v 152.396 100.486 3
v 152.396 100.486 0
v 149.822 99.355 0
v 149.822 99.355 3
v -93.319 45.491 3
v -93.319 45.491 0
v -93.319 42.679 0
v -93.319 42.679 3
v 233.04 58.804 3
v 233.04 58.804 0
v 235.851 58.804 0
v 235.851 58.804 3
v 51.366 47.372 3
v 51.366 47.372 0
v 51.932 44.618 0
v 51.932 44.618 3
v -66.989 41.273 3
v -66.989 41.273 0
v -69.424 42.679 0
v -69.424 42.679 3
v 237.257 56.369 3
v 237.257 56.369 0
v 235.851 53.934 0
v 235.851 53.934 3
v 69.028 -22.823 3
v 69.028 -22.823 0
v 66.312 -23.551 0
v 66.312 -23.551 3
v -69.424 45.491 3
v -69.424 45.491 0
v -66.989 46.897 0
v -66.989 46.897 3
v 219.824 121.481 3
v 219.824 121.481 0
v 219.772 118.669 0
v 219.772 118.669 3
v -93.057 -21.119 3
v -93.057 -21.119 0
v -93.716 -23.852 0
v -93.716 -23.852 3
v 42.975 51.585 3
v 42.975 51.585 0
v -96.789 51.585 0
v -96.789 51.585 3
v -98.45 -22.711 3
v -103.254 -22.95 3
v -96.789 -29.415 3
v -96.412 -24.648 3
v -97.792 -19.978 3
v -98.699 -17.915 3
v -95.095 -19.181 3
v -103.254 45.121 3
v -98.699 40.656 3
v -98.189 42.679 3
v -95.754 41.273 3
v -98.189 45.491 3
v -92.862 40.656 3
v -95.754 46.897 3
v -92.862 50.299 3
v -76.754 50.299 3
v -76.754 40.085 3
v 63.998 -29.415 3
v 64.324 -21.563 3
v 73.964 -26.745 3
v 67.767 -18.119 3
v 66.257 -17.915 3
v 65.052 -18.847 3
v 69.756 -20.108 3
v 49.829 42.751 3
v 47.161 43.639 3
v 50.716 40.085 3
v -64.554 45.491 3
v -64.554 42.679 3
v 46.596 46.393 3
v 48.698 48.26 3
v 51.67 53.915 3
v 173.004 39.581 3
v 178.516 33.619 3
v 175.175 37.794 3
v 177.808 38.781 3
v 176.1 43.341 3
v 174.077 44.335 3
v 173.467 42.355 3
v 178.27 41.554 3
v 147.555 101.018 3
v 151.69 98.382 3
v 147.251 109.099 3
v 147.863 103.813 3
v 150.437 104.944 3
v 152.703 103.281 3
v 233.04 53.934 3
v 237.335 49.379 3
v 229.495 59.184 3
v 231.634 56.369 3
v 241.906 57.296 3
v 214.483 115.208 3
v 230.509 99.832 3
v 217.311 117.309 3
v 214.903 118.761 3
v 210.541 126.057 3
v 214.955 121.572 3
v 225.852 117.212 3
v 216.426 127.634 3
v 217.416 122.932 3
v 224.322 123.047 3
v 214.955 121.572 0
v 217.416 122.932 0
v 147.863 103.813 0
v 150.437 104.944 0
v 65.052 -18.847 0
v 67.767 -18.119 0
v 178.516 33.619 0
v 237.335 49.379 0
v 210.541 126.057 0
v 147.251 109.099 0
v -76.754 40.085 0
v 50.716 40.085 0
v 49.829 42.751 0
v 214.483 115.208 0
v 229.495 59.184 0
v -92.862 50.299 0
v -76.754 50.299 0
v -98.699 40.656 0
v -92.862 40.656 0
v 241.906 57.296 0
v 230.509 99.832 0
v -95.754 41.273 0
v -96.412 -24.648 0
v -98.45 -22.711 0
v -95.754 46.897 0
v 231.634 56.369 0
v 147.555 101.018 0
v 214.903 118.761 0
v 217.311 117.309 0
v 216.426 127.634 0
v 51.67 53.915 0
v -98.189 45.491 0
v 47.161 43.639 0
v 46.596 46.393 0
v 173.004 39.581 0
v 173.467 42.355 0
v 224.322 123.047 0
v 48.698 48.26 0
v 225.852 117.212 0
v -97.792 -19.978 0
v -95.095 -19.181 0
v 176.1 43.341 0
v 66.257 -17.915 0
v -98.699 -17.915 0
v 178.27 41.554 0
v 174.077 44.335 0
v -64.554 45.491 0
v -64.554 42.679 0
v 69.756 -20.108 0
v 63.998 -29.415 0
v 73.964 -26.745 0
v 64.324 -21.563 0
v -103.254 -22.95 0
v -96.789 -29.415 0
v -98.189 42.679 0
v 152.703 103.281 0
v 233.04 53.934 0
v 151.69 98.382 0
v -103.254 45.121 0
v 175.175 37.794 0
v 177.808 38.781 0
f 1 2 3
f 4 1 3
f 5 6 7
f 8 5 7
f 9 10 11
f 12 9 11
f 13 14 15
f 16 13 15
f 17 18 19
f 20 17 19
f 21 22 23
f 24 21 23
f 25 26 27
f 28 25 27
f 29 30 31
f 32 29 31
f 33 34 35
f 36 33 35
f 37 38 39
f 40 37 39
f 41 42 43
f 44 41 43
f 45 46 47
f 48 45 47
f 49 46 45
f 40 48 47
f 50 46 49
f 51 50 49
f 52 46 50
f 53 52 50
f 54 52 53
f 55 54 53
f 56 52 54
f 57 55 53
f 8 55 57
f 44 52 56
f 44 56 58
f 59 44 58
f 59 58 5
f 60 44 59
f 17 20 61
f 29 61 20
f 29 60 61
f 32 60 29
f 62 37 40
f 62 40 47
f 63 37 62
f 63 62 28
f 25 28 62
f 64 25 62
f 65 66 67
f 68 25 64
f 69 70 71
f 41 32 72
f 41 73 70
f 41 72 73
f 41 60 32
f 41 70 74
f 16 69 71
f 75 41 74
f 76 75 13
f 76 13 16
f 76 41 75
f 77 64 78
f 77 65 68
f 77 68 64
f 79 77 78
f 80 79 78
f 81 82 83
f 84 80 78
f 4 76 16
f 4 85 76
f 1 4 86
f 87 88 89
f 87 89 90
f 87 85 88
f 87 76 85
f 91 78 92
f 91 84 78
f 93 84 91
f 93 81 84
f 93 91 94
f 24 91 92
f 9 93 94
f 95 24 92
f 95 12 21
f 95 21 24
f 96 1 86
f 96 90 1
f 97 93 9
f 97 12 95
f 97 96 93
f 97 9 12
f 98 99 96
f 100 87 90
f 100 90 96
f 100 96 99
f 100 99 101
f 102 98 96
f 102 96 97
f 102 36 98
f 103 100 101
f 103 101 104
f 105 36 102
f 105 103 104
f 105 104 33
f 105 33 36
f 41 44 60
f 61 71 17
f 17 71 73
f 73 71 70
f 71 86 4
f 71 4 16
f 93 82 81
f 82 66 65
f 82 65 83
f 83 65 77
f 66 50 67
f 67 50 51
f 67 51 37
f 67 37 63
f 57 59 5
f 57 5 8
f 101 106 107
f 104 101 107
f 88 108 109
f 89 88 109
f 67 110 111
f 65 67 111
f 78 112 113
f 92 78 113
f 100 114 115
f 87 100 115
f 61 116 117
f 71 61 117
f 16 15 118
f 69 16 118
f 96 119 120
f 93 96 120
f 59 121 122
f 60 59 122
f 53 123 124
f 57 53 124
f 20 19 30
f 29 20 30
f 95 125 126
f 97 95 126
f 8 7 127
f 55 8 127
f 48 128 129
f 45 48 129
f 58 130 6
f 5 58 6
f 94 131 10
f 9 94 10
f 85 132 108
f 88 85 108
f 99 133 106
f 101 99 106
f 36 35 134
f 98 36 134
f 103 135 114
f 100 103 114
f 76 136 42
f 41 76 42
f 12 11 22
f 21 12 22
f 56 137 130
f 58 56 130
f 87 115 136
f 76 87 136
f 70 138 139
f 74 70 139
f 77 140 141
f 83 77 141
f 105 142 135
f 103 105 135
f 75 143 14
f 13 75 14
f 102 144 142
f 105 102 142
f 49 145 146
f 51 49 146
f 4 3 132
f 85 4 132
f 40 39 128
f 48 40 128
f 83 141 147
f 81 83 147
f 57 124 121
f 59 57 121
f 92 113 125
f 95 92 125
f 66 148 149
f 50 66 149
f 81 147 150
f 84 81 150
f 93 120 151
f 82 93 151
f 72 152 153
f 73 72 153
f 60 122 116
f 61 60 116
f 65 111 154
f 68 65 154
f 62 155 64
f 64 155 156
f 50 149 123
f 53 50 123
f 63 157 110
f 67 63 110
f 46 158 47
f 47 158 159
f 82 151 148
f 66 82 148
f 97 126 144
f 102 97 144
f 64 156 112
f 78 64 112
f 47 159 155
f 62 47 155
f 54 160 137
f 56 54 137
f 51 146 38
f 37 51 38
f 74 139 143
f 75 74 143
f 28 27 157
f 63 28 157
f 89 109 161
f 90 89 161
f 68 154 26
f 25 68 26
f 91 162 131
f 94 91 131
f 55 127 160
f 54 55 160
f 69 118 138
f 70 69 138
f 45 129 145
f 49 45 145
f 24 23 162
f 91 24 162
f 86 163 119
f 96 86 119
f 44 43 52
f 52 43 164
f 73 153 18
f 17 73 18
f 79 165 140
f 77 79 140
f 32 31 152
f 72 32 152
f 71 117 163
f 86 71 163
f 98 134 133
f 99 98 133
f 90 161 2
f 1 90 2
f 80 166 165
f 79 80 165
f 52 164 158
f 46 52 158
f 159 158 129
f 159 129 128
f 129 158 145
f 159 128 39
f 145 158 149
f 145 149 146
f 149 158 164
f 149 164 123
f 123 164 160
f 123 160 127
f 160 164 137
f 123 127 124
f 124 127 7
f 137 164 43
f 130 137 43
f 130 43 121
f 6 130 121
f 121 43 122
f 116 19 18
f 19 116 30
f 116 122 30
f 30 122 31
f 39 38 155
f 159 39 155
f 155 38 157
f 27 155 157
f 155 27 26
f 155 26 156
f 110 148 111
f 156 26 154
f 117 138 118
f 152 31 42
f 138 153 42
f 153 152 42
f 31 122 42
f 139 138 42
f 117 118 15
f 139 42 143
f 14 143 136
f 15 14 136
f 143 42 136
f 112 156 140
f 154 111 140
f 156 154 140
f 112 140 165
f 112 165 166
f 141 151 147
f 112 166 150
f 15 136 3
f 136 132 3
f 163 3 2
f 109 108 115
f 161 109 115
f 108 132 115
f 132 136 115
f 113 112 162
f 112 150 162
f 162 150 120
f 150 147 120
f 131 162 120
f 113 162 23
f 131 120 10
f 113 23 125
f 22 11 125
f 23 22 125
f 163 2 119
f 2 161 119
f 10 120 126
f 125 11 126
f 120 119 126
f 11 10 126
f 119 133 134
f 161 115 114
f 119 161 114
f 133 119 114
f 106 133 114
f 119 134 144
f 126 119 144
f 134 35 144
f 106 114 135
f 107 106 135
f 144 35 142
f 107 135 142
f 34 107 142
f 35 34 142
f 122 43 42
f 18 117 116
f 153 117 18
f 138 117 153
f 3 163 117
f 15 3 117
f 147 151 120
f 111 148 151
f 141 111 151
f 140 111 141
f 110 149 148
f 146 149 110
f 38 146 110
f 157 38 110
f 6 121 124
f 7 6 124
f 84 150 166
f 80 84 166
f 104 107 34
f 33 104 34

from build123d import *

# Parameters (mm, degrees)
BOSS_EXTRU_1_DEPTH = 3


with BuildPart() as part:
    # Esquisse1 → Boss.-Extru.1 (new body)
    with BuildSketch(Plane.XY):
        Polygon((-75.988646329, 51.585106383), (-76.753762562, 51.585106383), (-92.861789188, 51.585106383), (-94.860830925, 51.585106383), (-96.789296468, 51.585106383), (-103.253762562, 45.120640289), (-103.253762562, 35.79522772), (-103.253762562, -22.950427523), (-96.789296468, -29.414893617), (63.997857106, -29.414893617), (73.963816863, -26.744522748), (178.515758799, 33.618569072), (237.335031683, 49.379145741), (241.906099495, 57.296467436), (230.508864659, 99.83152691), (225.851857518, 117.211714172), (224.321712805, 123.047343228), (216.426306891, 127.634040432), (210.540810955, 126.057026548), (147.250925797, 109.098552931), (51.669750275, 53.914735514), (42.975455994, 51.585106383), align=None)
        Polygon((-95.09515421, -19.181421764), (-93.057202321, -21.118529255), (-93.715810673, -23.852001108), (-96.412370914, -24.64836547), (-98.450322803, -22.71125798), (-97.791714451, -19.977786126), align=None, mode=Mode.SUBTRACT)
        Polygon((67.767414571, -18.119374886), (69.755583746, -20.107544061), (69.027863321, -22.82343366), (66.311973721, -23.551154085), (64.323804547, -21.56298491), (65.051524972, -18.847095311), align=None, mode=Mode.SUBTRACT)
        Polygon((-93.318762562, 45.490954288), (-93.318762562, 42.679258478), (-95.753762562, 41.273410572), (-98.188762562, 42.679258478), (-98.188762562, 45.490954288), (-95.753762562, 46.896802194), align=None, mode=Mode.SUBTRACT)
        Polygon((-66.988646329, 46.896802194), (-64.553646329, 45.490954288), (-64.553646329, 42.679258478), (-66.988646329, 41.273410572), (-69.423646329, 42.679258478), (-69.423646329, 45.490954288), align=None, mode=Mode.SUBTRACT)
        Polygon((51.366225237, 47.372350111), (51.931744927, 44.618113227), (49.829265662, 42.751240367), (47.161266708, 43.638604392), (46.595747018, 46.392841276), (48.698226283, 48.259714136), align=None, mode=Mode.SUBTRACT)
        Polygon((-76.753762562, 40.085106383), (2.011353671, 40.085106383), (50.71612997, 40.085106383), (151.689760112, 98.382258927), (214.4831558, 115.207698591), (229.494660416, 59.184000666), (174.076924484, 44.334863077), (66.257183131, -17.914893617), (-98.698564415, -17.914893617), (-98.698564415, 40.655573641), (-94.860830925, 40.655573641), (-92.861789188, 40.655573641), (-92.861789188, 48.636078378), (-92.861789188, 50.298812036), (-76.753762562, 50.298812036), (-76.753762562, 49.585106383), (-76.753762562, 48.636078378), align=None, mode=Mode.SUBTRACT)
        Polygon((176.099626255, 43.341034088), (178.27036991, 41.553995947), (177.808121311, 38.780557726), (175.175129056, 37.794157645), (173.004385401, 39.581195786), (173.466634, 42.354634007), align=None, mode=Mode.SUBTRACT)
        Polygon((235.851309069, 58.804459007), (237.257156975, 56.369459007), (235.851309069, 53.934459007), (233.039613258, 53.934459007), (231.633765353, 56.369459007), (233.039613258, 58.804459007), align=None, mode=Mode.SUBTRACT)
        Polygon((150.436891261, 104.94434728), (152.703485209, 103.280560873), (152.395900888, 100.48573973), (149.821722619, 99.354704995), (147.555128671, 101.018491402), (147.862712992, 103.813312544), align=None, mode=Mode.SUBTRACT)
        Polygon((219.824270363, 121.480626406), (219.771686266, 118.66942235), (217.310820089, 117.309359486), (214.90253801, 118.760500678), (214.955122108, 121.571704735), (217.415988284, 122.931767598), align=None, mode=Mode.SUBTRACT)
    extrude(amount=BOSS_EXTRU_1_DEPTH)


solid = part.part
